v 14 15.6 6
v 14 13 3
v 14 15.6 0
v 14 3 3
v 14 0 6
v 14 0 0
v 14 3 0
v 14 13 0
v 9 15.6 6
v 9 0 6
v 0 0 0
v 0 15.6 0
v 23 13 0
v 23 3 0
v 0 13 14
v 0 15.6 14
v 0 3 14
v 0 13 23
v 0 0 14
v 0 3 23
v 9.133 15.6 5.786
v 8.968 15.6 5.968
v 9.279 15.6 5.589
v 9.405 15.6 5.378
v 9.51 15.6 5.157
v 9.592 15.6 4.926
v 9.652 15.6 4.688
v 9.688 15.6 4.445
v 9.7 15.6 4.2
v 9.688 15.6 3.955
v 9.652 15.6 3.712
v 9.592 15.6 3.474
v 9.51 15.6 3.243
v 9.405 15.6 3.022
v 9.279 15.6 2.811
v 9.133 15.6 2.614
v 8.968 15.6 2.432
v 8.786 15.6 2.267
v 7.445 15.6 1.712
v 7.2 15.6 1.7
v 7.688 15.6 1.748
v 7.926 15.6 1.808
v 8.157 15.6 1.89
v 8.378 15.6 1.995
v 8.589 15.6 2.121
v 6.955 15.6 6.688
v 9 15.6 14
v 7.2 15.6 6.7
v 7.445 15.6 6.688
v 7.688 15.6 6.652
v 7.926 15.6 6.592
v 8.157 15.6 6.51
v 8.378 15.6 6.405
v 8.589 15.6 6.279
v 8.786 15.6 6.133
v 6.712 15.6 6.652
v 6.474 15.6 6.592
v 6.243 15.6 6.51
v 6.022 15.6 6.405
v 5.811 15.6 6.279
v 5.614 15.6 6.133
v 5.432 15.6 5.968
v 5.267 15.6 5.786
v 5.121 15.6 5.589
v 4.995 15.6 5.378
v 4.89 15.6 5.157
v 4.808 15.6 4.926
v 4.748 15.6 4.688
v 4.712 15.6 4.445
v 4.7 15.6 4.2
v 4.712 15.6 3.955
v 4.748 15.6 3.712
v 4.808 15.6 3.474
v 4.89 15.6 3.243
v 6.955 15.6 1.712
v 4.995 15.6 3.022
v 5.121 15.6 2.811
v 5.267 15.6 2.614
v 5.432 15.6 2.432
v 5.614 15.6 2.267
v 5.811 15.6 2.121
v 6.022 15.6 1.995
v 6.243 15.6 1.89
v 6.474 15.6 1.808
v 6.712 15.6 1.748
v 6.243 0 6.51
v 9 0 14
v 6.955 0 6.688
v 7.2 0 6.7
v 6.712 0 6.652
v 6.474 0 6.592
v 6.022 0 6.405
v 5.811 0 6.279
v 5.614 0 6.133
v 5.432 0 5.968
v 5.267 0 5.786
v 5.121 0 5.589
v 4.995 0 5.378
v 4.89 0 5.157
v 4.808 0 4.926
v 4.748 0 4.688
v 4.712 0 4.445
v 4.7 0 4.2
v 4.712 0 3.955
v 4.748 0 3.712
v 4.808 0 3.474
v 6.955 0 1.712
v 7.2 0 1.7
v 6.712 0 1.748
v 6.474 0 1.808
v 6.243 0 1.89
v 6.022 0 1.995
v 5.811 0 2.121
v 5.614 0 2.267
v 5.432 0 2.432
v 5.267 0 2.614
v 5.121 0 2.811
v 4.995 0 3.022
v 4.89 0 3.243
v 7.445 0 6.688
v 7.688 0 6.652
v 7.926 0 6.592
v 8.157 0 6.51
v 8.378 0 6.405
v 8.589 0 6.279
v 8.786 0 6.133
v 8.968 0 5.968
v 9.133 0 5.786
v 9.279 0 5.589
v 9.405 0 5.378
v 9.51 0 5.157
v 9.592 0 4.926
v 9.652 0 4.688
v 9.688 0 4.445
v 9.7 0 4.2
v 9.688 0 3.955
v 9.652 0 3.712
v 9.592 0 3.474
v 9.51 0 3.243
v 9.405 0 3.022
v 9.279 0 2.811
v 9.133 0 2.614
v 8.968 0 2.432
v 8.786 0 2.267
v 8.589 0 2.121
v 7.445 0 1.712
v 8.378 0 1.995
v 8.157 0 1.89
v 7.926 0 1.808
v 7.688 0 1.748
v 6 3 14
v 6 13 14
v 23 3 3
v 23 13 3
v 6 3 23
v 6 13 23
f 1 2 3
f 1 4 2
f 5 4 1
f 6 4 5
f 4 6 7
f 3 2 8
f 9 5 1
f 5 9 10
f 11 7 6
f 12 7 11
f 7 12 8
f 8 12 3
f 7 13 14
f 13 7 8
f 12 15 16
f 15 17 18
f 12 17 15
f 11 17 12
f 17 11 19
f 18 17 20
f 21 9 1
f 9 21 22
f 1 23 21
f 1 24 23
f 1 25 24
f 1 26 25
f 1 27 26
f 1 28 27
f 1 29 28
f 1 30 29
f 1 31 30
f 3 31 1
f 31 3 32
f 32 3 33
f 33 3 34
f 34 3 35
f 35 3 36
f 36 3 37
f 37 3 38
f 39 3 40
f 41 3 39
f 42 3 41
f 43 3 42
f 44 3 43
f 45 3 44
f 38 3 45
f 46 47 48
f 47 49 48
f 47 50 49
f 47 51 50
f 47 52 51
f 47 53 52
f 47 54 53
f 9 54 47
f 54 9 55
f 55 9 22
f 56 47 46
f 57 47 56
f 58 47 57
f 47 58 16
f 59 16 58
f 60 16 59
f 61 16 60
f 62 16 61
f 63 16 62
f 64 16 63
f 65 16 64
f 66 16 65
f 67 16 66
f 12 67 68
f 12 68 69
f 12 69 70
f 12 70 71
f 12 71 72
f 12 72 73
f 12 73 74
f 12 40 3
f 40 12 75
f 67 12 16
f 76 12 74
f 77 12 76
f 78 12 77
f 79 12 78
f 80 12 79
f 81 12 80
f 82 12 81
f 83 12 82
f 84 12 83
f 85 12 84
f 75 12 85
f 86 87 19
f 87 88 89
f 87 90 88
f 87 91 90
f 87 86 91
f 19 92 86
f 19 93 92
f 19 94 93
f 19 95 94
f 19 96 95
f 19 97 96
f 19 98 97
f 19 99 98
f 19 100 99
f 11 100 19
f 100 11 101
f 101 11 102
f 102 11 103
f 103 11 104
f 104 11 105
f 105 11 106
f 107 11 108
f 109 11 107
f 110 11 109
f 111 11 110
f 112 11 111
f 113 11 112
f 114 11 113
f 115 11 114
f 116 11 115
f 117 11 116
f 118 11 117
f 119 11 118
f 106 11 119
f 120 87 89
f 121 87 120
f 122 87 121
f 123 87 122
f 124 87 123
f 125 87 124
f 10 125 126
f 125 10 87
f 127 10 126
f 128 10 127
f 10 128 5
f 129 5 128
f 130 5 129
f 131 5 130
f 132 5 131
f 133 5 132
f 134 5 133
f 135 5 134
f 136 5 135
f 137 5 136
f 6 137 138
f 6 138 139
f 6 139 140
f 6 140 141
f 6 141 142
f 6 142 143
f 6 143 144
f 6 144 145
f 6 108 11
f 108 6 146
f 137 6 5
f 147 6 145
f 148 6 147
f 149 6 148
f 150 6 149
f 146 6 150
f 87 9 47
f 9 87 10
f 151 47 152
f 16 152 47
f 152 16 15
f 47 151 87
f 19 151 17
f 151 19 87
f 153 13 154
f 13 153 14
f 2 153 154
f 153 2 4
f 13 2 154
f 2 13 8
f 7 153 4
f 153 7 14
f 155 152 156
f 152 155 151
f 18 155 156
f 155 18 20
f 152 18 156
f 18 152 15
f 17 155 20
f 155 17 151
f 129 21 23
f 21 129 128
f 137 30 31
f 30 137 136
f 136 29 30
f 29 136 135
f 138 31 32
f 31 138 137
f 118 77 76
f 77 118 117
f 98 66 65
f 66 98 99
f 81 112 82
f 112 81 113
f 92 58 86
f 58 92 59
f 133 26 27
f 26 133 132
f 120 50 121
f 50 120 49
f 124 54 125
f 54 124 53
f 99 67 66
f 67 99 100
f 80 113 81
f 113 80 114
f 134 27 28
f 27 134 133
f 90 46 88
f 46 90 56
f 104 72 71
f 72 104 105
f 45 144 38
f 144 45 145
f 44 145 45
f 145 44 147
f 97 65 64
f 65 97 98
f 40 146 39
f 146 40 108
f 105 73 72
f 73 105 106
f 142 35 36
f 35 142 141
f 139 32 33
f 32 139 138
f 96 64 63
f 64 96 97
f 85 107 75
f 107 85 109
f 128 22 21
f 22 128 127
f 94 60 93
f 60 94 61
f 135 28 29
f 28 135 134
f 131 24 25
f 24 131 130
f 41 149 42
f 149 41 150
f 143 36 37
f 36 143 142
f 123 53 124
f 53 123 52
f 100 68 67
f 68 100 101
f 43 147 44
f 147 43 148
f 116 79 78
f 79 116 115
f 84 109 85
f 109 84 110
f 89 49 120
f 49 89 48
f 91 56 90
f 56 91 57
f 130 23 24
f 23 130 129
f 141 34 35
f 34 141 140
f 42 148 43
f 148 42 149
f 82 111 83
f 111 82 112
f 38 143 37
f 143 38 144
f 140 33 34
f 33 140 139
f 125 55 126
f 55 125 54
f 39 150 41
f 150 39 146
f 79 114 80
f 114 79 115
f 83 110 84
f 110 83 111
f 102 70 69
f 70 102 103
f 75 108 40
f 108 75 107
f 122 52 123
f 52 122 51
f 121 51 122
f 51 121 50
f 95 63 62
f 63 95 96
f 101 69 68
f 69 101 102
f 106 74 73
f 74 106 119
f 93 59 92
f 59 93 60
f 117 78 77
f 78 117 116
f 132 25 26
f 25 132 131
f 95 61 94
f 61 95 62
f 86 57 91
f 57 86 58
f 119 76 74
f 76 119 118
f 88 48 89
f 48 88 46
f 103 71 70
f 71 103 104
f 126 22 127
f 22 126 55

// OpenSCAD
use <../threads/isothreads.scad>


$fn=0;

fullwidth=15.6;
narrolength=23;

// Functions to pass variables up to user of this module
function fanwidth()=fullwidth;
function tablength()=narrolength;

function segments (diameter) = min (($fn < 0.01) ? 50 : 2, ceil (diameter*6));

module frame(padding)
{
    fullthick=6.0;
    fulllength=14;
    narrothick=3;
    narrowidth=10;
    
    cube([fulllength,fullwidth,fullthick],center=false);
    cube([fullthick+padding,fullwidth,fulllength],center=false);
    
    translate([0,3,0])cube([narrolength,narrowidth,narrothick],center=false);
    translate([0,3,0])cube([narrothick+padding,narrowidth,narrolength],center=false);
}

module onecorner(padding=0,thread=false)
{
    holecenter=4.2;
    
    difference()
    {
        frame(padding);
        translate([holecenter+padding,0,holecenter])rotate([-90,0,0])
            if (thread)           
                {m4thread();}
            else
                {m4hole();}
    }
}


module m4hole()
{
    $fn=64;
    height=20;
    translate([0,0,height/2])cylinder(d=5,h=height,center=true);
}

module m4thread()
{
    height=20;
    translate([0,0,0])metric_thread (diameter=8, pitch=1, length=height);   
}

onecorner(3);
//m4thread();
//m4hole();
